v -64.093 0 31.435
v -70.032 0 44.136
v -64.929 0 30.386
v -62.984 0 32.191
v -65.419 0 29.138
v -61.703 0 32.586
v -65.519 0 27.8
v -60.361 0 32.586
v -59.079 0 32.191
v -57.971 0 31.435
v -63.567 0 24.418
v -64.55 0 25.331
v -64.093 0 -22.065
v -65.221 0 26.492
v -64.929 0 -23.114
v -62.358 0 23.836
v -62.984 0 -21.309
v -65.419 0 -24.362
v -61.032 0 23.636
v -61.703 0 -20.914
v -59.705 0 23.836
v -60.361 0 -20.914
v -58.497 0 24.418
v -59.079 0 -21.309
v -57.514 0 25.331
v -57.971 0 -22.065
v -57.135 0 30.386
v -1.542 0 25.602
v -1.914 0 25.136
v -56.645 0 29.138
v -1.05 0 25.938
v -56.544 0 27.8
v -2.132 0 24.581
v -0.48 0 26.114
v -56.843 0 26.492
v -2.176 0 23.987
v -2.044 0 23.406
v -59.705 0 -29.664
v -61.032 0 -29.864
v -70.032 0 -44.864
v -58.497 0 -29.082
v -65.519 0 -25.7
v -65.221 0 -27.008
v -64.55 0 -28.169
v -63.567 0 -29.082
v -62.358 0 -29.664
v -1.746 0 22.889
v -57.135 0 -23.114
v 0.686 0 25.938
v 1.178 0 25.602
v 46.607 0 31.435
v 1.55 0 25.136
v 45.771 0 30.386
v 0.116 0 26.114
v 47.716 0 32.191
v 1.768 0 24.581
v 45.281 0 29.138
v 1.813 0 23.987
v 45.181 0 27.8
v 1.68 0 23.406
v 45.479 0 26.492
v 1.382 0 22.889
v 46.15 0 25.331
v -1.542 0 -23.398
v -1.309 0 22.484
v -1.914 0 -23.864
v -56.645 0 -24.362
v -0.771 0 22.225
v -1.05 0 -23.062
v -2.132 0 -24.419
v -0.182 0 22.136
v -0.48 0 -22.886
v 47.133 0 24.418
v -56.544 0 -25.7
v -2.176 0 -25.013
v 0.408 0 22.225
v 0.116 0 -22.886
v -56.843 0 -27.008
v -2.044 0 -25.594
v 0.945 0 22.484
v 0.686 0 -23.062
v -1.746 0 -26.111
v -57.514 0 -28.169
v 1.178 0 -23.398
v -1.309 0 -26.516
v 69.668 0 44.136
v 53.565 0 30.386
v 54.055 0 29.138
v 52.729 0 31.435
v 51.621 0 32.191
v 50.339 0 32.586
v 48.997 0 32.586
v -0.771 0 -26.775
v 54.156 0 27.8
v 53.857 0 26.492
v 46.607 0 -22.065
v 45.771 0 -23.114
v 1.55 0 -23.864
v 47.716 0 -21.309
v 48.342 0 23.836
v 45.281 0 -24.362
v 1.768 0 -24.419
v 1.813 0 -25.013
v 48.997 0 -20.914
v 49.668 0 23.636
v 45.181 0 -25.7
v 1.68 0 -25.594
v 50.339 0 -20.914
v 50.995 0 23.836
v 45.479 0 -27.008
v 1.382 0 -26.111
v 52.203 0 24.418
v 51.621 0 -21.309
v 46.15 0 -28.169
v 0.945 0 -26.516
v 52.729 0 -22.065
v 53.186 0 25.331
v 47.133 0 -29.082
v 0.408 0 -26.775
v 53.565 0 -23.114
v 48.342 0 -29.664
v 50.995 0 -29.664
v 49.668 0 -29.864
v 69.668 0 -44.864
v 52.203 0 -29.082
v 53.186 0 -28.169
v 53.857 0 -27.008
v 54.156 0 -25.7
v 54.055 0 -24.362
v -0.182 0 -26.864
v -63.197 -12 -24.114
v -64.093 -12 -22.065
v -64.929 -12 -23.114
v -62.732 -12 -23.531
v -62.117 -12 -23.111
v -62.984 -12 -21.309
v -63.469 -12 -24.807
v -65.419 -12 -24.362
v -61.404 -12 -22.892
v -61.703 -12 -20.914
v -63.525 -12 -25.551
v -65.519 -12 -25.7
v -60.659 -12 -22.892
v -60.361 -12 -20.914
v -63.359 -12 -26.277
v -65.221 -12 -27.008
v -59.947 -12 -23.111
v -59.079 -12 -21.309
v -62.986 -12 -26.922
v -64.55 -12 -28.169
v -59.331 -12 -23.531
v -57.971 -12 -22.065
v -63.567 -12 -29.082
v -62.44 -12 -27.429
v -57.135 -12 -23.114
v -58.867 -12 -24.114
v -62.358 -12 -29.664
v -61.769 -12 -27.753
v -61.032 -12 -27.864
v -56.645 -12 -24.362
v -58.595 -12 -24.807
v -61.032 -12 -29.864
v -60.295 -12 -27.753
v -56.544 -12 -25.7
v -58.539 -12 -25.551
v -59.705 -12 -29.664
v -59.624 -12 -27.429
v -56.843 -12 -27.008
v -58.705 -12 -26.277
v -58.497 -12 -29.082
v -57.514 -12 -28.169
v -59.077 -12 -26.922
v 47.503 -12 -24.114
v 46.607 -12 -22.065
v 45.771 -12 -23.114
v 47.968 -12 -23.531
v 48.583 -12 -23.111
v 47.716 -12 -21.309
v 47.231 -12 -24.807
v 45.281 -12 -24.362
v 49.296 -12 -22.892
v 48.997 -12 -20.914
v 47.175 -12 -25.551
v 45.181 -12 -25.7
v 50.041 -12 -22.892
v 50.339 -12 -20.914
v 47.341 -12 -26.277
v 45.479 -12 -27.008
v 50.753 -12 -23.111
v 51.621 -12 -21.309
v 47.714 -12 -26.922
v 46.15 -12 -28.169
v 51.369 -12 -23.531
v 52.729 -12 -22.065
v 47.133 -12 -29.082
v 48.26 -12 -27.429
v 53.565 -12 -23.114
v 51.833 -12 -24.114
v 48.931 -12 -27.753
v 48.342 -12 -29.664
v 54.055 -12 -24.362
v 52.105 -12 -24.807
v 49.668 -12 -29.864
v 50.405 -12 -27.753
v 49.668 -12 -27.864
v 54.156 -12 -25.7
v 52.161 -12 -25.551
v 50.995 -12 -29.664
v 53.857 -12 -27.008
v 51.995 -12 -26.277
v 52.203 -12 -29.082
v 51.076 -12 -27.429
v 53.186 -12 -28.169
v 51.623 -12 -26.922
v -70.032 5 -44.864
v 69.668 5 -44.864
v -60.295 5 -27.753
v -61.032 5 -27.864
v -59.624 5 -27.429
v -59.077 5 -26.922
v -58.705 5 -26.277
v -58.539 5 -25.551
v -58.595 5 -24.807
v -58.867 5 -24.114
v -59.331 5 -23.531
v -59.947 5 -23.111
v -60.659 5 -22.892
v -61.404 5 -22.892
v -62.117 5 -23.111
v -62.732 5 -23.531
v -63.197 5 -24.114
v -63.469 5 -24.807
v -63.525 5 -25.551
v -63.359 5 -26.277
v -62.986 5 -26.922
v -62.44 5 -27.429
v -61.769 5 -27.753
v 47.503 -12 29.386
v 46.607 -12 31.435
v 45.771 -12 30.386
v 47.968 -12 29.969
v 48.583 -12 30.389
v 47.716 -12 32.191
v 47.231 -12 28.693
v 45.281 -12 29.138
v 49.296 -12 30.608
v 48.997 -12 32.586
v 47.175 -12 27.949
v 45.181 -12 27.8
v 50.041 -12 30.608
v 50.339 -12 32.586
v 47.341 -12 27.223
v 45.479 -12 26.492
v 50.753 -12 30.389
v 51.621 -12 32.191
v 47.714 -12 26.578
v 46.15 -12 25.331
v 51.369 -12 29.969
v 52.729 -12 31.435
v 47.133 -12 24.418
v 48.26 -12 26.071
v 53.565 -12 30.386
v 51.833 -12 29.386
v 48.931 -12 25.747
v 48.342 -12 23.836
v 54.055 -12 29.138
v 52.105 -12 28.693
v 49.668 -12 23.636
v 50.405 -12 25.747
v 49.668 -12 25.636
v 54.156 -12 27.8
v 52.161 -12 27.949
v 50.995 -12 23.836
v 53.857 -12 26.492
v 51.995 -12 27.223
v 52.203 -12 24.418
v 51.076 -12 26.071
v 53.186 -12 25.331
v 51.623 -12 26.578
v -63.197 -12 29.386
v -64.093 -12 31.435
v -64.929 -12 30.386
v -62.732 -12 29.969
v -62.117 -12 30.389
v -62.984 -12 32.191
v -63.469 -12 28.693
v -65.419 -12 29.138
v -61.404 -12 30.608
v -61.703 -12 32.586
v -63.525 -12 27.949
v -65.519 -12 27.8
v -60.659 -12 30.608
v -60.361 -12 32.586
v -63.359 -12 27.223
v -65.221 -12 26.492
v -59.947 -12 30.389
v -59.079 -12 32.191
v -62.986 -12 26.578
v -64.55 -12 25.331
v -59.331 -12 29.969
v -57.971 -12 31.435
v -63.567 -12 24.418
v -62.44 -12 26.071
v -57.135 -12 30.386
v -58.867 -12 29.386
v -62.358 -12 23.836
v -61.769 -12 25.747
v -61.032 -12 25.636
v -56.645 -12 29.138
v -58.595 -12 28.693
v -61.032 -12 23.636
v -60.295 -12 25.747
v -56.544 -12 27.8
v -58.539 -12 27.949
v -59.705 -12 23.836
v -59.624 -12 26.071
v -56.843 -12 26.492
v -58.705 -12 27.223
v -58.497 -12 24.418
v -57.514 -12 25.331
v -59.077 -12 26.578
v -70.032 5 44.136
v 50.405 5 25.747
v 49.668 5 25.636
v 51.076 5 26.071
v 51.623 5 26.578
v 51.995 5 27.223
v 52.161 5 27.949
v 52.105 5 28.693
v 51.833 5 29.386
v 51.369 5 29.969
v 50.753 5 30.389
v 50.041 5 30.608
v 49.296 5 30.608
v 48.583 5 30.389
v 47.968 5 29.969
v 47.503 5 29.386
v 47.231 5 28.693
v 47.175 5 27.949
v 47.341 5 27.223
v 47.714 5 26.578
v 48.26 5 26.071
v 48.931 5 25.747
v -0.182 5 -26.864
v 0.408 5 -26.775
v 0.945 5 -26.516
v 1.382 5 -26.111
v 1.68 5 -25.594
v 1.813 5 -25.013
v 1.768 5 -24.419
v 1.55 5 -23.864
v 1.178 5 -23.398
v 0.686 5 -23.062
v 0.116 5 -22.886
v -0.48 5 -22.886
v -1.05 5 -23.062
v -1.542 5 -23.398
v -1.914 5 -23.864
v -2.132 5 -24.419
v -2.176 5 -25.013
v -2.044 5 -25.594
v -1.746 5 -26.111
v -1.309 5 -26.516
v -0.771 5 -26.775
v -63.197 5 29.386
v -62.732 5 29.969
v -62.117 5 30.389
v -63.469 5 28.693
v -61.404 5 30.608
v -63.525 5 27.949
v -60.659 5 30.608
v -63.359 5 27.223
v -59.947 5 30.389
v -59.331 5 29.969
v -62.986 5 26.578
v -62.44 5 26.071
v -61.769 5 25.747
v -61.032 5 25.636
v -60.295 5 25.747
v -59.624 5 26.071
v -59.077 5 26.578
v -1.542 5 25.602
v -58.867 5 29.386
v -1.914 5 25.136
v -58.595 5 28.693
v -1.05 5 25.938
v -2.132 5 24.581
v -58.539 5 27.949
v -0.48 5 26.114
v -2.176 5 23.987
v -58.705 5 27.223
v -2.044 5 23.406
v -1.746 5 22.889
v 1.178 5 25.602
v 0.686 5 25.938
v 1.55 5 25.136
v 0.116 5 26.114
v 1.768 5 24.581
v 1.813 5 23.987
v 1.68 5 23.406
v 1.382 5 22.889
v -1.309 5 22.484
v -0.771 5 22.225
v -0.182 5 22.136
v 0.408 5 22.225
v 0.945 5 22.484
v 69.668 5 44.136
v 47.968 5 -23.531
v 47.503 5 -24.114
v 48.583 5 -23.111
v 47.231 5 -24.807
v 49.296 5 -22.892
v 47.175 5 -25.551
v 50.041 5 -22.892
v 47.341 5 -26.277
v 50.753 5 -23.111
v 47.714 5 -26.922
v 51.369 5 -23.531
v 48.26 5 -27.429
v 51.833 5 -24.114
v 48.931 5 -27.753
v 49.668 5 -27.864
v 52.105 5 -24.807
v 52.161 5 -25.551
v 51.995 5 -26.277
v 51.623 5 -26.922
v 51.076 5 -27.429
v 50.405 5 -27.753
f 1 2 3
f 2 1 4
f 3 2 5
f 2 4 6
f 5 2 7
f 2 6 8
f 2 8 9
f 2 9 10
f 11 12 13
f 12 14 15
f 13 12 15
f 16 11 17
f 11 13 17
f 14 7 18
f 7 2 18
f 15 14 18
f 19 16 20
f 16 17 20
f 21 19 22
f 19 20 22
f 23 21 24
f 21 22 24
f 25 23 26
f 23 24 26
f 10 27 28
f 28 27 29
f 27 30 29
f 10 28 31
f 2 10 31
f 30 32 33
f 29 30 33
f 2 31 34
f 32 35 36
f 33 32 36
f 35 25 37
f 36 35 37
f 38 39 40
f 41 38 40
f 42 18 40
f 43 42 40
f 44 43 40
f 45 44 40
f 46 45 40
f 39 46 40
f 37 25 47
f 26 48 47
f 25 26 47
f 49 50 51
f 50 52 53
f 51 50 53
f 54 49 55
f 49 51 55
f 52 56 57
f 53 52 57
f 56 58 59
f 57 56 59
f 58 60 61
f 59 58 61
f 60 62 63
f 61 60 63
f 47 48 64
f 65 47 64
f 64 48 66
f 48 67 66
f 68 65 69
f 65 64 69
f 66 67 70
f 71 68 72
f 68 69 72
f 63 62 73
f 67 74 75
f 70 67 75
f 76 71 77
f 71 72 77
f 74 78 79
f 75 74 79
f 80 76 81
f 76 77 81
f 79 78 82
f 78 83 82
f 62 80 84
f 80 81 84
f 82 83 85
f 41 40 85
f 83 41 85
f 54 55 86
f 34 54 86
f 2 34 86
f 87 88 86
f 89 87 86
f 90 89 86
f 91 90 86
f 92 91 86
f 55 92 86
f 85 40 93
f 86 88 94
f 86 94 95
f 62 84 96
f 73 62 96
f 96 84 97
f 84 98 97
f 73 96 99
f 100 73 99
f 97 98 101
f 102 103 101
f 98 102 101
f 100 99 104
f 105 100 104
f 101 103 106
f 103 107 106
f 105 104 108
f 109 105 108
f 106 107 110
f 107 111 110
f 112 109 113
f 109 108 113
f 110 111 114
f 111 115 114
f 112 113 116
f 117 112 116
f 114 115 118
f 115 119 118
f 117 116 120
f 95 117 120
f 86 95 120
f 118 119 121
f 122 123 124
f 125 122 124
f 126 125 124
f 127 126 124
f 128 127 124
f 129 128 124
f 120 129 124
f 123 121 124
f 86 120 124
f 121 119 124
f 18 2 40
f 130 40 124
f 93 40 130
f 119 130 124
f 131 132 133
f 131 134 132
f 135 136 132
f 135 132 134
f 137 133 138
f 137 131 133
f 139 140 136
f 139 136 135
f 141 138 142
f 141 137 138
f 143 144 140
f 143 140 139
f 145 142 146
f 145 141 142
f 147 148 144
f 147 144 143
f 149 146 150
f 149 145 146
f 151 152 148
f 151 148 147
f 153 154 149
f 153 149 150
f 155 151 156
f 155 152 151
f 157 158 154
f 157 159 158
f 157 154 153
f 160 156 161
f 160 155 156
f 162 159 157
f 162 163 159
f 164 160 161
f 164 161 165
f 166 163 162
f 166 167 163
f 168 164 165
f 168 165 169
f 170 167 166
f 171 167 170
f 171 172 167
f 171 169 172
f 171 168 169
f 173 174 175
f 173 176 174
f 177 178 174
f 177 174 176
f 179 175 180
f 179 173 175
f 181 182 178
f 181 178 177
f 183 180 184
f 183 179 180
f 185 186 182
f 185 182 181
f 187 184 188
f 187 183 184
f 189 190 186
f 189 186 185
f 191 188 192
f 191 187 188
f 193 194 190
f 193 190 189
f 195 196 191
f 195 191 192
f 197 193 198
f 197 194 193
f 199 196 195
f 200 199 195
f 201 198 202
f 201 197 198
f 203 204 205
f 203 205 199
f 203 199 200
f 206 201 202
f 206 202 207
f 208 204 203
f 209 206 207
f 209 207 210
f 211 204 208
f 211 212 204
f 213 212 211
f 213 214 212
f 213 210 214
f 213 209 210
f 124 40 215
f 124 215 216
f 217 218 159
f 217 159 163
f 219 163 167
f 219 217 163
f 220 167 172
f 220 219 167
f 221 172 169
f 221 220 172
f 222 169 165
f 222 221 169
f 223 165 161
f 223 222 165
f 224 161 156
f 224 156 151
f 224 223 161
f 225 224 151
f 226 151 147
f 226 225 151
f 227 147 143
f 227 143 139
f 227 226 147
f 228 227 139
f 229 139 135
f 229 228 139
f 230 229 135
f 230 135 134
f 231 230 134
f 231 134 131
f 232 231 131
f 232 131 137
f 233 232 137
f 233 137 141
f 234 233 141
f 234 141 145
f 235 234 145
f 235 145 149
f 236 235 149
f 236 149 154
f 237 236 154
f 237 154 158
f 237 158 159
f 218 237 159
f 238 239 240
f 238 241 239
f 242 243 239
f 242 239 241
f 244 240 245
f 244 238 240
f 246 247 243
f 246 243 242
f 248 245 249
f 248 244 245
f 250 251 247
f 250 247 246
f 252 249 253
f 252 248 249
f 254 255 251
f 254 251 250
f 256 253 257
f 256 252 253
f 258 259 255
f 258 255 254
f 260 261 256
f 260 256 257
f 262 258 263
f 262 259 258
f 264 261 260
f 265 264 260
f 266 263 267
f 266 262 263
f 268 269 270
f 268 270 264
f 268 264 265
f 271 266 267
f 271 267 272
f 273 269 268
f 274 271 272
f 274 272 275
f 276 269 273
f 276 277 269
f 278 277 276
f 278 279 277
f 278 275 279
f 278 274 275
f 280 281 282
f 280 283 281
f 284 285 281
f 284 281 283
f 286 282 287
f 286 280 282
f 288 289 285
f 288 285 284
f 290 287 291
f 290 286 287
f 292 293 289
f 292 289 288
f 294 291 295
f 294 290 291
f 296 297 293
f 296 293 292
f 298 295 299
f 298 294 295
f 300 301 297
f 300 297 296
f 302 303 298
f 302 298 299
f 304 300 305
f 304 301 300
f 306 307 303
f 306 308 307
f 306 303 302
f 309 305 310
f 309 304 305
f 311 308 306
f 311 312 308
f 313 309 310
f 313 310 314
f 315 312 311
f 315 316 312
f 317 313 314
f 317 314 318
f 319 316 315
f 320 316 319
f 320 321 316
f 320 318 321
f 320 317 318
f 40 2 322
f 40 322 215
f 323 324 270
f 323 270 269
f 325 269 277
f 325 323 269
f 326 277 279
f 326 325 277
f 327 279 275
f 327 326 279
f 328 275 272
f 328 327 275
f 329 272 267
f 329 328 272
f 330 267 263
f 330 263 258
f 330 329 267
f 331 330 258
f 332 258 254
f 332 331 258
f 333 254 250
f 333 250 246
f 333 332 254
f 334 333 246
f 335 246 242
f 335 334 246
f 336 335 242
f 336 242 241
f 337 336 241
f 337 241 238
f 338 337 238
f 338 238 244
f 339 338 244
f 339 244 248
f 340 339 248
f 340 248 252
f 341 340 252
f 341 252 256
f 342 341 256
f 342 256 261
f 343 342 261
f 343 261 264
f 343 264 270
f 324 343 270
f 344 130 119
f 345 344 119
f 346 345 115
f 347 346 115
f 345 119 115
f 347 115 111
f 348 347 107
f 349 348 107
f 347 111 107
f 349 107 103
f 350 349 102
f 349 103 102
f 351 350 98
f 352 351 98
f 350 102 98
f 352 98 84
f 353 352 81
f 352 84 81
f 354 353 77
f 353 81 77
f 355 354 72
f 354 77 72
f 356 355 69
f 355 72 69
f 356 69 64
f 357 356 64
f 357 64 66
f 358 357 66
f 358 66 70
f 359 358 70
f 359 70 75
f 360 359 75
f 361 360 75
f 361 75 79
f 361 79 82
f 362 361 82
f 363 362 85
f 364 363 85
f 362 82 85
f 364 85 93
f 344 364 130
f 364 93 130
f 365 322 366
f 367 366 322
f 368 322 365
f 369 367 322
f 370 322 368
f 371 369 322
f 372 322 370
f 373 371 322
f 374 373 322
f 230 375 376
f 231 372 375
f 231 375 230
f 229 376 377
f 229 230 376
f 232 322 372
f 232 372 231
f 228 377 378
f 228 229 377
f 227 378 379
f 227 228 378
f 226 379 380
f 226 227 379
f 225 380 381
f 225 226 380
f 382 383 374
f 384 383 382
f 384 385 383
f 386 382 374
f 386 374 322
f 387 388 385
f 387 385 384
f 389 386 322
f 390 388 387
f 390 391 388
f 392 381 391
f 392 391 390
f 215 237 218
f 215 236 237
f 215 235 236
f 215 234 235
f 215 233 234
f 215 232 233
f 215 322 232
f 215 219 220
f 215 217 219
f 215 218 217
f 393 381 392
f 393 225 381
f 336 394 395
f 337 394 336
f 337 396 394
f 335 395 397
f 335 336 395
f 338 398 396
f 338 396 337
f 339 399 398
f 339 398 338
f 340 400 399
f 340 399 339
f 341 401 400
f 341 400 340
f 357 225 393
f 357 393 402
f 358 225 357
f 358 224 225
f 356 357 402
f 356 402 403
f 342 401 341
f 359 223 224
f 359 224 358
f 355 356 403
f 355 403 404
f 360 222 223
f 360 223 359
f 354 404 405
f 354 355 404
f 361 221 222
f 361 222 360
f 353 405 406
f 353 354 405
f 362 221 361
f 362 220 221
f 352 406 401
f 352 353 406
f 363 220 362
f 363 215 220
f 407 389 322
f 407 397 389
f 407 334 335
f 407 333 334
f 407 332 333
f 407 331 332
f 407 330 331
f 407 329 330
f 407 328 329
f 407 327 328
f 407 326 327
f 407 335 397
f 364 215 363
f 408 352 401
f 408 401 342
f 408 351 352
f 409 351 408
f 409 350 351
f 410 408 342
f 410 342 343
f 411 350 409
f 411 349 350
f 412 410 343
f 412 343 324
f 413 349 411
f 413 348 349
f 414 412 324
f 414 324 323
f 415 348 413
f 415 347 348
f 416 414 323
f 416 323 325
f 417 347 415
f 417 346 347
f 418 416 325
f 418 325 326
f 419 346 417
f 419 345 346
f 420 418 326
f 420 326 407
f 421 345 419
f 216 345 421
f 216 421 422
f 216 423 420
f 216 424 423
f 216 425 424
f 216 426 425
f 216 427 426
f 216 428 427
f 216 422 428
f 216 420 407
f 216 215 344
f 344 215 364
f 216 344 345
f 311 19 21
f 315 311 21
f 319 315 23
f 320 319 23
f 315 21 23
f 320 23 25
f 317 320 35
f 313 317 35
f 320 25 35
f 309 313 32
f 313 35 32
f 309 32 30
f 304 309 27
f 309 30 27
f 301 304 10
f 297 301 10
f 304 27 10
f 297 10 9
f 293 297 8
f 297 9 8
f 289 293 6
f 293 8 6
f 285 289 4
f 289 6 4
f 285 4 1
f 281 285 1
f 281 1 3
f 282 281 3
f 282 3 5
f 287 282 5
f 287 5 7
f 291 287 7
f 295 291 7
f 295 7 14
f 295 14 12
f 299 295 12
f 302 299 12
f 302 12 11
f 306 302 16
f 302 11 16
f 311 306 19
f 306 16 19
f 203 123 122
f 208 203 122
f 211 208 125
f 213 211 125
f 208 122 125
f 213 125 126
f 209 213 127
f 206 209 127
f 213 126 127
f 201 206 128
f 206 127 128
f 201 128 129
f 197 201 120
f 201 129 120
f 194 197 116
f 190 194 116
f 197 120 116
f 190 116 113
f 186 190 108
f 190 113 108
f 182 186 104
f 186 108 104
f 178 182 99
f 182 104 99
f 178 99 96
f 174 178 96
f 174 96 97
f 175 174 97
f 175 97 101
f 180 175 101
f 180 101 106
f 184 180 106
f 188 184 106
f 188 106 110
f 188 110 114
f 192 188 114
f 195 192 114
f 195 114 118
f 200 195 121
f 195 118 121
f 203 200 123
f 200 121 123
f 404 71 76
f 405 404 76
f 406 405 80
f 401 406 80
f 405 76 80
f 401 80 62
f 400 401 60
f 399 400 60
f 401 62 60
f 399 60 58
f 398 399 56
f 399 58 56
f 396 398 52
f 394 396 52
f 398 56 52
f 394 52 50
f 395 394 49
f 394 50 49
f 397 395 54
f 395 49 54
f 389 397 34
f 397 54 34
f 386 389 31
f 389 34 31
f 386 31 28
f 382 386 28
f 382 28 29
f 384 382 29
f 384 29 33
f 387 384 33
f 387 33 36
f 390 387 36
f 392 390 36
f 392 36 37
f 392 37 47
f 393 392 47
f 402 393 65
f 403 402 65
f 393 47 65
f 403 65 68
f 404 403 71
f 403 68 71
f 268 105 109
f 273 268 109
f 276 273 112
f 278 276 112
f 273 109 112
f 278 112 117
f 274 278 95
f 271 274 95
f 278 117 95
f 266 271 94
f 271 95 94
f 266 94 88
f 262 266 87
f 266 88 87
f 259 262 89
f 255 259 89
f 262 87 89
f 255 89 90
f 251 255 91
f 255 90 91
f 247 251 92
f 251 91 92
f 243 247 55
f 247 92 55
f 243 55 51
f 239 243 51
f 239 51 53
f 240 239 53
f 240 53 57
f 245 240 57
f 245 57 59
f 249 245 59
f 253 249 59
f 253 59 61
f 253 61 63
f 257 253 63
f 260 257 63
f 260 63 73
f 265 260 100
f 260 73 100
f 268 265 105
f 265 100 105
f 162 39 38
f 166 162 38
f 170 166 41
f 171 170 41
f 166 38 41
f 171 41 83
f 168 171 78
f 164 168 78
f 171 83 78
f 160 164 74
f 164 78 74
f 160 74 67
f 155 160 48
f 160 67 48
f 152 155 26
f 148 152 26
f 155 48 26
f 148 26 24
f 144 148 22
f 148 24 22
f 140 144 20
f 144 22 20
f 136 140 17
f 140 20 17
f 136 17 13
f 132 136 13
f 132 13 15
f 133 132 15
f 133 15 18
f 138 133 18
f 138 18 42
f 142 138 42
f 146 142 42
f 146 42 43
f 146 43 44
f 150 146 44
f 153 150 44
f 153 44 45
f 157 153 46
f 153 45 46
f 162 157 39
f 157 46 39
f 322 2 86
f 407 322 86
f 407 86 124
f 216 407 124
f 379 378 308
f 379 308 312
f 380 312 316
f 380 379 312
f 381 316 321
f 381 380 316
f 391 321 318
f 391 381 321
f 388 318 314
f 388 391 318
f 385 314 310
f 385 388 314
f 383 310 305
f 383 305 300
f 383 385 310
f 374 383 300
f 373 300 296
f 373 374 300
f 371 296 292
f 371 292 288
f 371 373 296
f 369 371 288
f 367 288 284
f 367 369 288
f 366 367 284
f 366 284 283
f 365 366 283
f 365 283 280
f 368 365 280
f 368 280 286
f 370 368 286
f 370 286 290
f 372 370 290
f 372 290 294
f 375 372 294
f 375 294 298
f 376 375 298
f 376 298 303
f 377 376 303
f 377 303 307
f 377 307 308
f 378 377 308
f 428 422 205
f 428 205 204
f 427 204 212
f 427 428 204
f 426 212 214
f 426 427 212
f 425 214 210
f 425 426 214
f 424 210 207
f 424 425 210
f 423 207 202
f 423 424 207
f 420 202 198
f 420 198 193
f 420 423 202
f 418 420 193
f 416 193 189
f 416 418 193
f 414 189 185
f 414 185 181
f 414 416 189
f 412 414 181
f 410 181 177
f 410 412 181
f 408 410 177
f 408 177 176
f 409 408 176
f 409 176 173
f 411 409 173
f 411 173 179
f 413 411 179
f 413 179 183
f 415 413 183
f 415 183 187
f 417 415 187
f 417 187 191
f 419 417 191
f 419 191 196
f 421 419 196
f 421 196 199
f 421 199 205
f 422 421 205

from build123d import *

# Parameters (mm, degrees)
SKETCH1_W           = 139.7
SKETCH1_H           = 89
BOSS_EXTRUDE1_DEPTH = 5
SKETCH4_R           = 4.5
SKETCH4_R_2         = 2.5
BOSS_EXTRUDE2_DEPTH = 12
SKETCH12_R          = 2
CUT_EXTRUDE1_DEPTH  = 5
CUT_EXTRUDE2_START  = -10
SKETCH13_R          = 2.5
CUT_EXTRUDE2_DEPTH  = 10


with BuildPart() as part:
    # Sketch1 → Boss-Extrude1 (new body)
    with BuildSketch(Plane(origin=(0, 0, 0), x_dir=(1, 0, 0), z_dir=(0, 1, 0))):
        with Locations((-0.18185994, 0.363719879)):
            Rectangle(SKETCH1_W, SKETCH1_H)
    extrude(amount=BOSS_EXTRUDE1_DEPTH)

    # Sketch4 → Boss-Extrude2 (add)
    # profile 1 of 4: a face of its own
    with BuildSketch(Plane.XZ):
        with Locations(Location((-61.03185994, 28.136280121, 0), (0, 0, 270))):
            Circle(SKETCH4_R)
        with Locations(Location((-61.03185994, 28.136280121, 0), (0, 0, 270))):
            Circle(SKETCH4_R_2, mode=Mode.SUBTRACT)
    # profile 2 of 4: a face of its own
    with BuildSketch(Plane.XZ):
        with Locations(Location((49.66814006, 28.136280121, 0), (0, 0, 270))):
            Circle(SKETCH4_R)
        with Locations(Location((49.66814006, 28.136280121, 0), (0, 0, 270))):
            Circle(SKETCH4_R_2, mode=Mode.SUBTRACT)
    # profile 3 of 4: a face of its own
    with BuildSketch(Plane.XZ):
        with Locations(Location((-61.03185994, -25.363719879, 0), (0, 0, 270))):
            Circle(SKETCH4_R)
        with Locations(Location((-61.03185994, -25.363719879, 0), (0, 0, 270))):
            Circle(SKETCH4_R_2, mode=Mode.SUBTRACT)
    # profile 4 of 4: a face of its own
    with BuildSketch(Plane.XZ):
        with Locations(Location((49.66814006, -25.363719879, 0), (0, 0, 270))):
            Circle(SKETCH4_R)
        with Locations(Location((49.66814006, -25.363719879, 0), (0, 0, 270))):
            Circle(SKETCH4_R_2, mode=Mode.SUBTRACT)
    extrude(amount=BOSS_EXTRUDE2_DEPTH)

    # Sketch12 → Cut-Extrude1 (cut)
    with BuildSketch(Plane.XZ):
        with Locations(Location((-0.18185994, 24.136280121, 0), (0, 0, 270))):
            Circle(SKETCH12_R)
        with Locations(Location((-0.18185994, -24.863719879, 0), (0, 0, 270))):
            Circle(SKETCH12_R)
    extrude(amount=-CUT_EXTRUDE1_DEPTH, mode=Mode.SUBTRACT)

    # Sketch13 → Cut-Extrude2 (cut)
    with BuildSketch(Plane.XZ.offset(CUT_EXTRUDE2_START)):
        with Locations(Location((-61.03185994, 28.136280121, 0), (0, 0, 270))):
            Circle(SKETCH13_R)
        with Locations(Location((-61.03185994, -25.363719879, 0), (0, 0, 270))):
            Circle(SKETCH13_R)
        with Locations(Location((49.66814006, -25.363719879, 0), (0, 0, 270))):
            Circle(SKETCH13_R)
        with Locations(Location((49.66814006, 28.136280121, 0), (0, 0, 270))):
            Circle(SKETCH13_R)
    extrude(amount=CUT_EXTRUDE2_DEPTH, mode=Mode.SUBTRACT)


solid = part.part
